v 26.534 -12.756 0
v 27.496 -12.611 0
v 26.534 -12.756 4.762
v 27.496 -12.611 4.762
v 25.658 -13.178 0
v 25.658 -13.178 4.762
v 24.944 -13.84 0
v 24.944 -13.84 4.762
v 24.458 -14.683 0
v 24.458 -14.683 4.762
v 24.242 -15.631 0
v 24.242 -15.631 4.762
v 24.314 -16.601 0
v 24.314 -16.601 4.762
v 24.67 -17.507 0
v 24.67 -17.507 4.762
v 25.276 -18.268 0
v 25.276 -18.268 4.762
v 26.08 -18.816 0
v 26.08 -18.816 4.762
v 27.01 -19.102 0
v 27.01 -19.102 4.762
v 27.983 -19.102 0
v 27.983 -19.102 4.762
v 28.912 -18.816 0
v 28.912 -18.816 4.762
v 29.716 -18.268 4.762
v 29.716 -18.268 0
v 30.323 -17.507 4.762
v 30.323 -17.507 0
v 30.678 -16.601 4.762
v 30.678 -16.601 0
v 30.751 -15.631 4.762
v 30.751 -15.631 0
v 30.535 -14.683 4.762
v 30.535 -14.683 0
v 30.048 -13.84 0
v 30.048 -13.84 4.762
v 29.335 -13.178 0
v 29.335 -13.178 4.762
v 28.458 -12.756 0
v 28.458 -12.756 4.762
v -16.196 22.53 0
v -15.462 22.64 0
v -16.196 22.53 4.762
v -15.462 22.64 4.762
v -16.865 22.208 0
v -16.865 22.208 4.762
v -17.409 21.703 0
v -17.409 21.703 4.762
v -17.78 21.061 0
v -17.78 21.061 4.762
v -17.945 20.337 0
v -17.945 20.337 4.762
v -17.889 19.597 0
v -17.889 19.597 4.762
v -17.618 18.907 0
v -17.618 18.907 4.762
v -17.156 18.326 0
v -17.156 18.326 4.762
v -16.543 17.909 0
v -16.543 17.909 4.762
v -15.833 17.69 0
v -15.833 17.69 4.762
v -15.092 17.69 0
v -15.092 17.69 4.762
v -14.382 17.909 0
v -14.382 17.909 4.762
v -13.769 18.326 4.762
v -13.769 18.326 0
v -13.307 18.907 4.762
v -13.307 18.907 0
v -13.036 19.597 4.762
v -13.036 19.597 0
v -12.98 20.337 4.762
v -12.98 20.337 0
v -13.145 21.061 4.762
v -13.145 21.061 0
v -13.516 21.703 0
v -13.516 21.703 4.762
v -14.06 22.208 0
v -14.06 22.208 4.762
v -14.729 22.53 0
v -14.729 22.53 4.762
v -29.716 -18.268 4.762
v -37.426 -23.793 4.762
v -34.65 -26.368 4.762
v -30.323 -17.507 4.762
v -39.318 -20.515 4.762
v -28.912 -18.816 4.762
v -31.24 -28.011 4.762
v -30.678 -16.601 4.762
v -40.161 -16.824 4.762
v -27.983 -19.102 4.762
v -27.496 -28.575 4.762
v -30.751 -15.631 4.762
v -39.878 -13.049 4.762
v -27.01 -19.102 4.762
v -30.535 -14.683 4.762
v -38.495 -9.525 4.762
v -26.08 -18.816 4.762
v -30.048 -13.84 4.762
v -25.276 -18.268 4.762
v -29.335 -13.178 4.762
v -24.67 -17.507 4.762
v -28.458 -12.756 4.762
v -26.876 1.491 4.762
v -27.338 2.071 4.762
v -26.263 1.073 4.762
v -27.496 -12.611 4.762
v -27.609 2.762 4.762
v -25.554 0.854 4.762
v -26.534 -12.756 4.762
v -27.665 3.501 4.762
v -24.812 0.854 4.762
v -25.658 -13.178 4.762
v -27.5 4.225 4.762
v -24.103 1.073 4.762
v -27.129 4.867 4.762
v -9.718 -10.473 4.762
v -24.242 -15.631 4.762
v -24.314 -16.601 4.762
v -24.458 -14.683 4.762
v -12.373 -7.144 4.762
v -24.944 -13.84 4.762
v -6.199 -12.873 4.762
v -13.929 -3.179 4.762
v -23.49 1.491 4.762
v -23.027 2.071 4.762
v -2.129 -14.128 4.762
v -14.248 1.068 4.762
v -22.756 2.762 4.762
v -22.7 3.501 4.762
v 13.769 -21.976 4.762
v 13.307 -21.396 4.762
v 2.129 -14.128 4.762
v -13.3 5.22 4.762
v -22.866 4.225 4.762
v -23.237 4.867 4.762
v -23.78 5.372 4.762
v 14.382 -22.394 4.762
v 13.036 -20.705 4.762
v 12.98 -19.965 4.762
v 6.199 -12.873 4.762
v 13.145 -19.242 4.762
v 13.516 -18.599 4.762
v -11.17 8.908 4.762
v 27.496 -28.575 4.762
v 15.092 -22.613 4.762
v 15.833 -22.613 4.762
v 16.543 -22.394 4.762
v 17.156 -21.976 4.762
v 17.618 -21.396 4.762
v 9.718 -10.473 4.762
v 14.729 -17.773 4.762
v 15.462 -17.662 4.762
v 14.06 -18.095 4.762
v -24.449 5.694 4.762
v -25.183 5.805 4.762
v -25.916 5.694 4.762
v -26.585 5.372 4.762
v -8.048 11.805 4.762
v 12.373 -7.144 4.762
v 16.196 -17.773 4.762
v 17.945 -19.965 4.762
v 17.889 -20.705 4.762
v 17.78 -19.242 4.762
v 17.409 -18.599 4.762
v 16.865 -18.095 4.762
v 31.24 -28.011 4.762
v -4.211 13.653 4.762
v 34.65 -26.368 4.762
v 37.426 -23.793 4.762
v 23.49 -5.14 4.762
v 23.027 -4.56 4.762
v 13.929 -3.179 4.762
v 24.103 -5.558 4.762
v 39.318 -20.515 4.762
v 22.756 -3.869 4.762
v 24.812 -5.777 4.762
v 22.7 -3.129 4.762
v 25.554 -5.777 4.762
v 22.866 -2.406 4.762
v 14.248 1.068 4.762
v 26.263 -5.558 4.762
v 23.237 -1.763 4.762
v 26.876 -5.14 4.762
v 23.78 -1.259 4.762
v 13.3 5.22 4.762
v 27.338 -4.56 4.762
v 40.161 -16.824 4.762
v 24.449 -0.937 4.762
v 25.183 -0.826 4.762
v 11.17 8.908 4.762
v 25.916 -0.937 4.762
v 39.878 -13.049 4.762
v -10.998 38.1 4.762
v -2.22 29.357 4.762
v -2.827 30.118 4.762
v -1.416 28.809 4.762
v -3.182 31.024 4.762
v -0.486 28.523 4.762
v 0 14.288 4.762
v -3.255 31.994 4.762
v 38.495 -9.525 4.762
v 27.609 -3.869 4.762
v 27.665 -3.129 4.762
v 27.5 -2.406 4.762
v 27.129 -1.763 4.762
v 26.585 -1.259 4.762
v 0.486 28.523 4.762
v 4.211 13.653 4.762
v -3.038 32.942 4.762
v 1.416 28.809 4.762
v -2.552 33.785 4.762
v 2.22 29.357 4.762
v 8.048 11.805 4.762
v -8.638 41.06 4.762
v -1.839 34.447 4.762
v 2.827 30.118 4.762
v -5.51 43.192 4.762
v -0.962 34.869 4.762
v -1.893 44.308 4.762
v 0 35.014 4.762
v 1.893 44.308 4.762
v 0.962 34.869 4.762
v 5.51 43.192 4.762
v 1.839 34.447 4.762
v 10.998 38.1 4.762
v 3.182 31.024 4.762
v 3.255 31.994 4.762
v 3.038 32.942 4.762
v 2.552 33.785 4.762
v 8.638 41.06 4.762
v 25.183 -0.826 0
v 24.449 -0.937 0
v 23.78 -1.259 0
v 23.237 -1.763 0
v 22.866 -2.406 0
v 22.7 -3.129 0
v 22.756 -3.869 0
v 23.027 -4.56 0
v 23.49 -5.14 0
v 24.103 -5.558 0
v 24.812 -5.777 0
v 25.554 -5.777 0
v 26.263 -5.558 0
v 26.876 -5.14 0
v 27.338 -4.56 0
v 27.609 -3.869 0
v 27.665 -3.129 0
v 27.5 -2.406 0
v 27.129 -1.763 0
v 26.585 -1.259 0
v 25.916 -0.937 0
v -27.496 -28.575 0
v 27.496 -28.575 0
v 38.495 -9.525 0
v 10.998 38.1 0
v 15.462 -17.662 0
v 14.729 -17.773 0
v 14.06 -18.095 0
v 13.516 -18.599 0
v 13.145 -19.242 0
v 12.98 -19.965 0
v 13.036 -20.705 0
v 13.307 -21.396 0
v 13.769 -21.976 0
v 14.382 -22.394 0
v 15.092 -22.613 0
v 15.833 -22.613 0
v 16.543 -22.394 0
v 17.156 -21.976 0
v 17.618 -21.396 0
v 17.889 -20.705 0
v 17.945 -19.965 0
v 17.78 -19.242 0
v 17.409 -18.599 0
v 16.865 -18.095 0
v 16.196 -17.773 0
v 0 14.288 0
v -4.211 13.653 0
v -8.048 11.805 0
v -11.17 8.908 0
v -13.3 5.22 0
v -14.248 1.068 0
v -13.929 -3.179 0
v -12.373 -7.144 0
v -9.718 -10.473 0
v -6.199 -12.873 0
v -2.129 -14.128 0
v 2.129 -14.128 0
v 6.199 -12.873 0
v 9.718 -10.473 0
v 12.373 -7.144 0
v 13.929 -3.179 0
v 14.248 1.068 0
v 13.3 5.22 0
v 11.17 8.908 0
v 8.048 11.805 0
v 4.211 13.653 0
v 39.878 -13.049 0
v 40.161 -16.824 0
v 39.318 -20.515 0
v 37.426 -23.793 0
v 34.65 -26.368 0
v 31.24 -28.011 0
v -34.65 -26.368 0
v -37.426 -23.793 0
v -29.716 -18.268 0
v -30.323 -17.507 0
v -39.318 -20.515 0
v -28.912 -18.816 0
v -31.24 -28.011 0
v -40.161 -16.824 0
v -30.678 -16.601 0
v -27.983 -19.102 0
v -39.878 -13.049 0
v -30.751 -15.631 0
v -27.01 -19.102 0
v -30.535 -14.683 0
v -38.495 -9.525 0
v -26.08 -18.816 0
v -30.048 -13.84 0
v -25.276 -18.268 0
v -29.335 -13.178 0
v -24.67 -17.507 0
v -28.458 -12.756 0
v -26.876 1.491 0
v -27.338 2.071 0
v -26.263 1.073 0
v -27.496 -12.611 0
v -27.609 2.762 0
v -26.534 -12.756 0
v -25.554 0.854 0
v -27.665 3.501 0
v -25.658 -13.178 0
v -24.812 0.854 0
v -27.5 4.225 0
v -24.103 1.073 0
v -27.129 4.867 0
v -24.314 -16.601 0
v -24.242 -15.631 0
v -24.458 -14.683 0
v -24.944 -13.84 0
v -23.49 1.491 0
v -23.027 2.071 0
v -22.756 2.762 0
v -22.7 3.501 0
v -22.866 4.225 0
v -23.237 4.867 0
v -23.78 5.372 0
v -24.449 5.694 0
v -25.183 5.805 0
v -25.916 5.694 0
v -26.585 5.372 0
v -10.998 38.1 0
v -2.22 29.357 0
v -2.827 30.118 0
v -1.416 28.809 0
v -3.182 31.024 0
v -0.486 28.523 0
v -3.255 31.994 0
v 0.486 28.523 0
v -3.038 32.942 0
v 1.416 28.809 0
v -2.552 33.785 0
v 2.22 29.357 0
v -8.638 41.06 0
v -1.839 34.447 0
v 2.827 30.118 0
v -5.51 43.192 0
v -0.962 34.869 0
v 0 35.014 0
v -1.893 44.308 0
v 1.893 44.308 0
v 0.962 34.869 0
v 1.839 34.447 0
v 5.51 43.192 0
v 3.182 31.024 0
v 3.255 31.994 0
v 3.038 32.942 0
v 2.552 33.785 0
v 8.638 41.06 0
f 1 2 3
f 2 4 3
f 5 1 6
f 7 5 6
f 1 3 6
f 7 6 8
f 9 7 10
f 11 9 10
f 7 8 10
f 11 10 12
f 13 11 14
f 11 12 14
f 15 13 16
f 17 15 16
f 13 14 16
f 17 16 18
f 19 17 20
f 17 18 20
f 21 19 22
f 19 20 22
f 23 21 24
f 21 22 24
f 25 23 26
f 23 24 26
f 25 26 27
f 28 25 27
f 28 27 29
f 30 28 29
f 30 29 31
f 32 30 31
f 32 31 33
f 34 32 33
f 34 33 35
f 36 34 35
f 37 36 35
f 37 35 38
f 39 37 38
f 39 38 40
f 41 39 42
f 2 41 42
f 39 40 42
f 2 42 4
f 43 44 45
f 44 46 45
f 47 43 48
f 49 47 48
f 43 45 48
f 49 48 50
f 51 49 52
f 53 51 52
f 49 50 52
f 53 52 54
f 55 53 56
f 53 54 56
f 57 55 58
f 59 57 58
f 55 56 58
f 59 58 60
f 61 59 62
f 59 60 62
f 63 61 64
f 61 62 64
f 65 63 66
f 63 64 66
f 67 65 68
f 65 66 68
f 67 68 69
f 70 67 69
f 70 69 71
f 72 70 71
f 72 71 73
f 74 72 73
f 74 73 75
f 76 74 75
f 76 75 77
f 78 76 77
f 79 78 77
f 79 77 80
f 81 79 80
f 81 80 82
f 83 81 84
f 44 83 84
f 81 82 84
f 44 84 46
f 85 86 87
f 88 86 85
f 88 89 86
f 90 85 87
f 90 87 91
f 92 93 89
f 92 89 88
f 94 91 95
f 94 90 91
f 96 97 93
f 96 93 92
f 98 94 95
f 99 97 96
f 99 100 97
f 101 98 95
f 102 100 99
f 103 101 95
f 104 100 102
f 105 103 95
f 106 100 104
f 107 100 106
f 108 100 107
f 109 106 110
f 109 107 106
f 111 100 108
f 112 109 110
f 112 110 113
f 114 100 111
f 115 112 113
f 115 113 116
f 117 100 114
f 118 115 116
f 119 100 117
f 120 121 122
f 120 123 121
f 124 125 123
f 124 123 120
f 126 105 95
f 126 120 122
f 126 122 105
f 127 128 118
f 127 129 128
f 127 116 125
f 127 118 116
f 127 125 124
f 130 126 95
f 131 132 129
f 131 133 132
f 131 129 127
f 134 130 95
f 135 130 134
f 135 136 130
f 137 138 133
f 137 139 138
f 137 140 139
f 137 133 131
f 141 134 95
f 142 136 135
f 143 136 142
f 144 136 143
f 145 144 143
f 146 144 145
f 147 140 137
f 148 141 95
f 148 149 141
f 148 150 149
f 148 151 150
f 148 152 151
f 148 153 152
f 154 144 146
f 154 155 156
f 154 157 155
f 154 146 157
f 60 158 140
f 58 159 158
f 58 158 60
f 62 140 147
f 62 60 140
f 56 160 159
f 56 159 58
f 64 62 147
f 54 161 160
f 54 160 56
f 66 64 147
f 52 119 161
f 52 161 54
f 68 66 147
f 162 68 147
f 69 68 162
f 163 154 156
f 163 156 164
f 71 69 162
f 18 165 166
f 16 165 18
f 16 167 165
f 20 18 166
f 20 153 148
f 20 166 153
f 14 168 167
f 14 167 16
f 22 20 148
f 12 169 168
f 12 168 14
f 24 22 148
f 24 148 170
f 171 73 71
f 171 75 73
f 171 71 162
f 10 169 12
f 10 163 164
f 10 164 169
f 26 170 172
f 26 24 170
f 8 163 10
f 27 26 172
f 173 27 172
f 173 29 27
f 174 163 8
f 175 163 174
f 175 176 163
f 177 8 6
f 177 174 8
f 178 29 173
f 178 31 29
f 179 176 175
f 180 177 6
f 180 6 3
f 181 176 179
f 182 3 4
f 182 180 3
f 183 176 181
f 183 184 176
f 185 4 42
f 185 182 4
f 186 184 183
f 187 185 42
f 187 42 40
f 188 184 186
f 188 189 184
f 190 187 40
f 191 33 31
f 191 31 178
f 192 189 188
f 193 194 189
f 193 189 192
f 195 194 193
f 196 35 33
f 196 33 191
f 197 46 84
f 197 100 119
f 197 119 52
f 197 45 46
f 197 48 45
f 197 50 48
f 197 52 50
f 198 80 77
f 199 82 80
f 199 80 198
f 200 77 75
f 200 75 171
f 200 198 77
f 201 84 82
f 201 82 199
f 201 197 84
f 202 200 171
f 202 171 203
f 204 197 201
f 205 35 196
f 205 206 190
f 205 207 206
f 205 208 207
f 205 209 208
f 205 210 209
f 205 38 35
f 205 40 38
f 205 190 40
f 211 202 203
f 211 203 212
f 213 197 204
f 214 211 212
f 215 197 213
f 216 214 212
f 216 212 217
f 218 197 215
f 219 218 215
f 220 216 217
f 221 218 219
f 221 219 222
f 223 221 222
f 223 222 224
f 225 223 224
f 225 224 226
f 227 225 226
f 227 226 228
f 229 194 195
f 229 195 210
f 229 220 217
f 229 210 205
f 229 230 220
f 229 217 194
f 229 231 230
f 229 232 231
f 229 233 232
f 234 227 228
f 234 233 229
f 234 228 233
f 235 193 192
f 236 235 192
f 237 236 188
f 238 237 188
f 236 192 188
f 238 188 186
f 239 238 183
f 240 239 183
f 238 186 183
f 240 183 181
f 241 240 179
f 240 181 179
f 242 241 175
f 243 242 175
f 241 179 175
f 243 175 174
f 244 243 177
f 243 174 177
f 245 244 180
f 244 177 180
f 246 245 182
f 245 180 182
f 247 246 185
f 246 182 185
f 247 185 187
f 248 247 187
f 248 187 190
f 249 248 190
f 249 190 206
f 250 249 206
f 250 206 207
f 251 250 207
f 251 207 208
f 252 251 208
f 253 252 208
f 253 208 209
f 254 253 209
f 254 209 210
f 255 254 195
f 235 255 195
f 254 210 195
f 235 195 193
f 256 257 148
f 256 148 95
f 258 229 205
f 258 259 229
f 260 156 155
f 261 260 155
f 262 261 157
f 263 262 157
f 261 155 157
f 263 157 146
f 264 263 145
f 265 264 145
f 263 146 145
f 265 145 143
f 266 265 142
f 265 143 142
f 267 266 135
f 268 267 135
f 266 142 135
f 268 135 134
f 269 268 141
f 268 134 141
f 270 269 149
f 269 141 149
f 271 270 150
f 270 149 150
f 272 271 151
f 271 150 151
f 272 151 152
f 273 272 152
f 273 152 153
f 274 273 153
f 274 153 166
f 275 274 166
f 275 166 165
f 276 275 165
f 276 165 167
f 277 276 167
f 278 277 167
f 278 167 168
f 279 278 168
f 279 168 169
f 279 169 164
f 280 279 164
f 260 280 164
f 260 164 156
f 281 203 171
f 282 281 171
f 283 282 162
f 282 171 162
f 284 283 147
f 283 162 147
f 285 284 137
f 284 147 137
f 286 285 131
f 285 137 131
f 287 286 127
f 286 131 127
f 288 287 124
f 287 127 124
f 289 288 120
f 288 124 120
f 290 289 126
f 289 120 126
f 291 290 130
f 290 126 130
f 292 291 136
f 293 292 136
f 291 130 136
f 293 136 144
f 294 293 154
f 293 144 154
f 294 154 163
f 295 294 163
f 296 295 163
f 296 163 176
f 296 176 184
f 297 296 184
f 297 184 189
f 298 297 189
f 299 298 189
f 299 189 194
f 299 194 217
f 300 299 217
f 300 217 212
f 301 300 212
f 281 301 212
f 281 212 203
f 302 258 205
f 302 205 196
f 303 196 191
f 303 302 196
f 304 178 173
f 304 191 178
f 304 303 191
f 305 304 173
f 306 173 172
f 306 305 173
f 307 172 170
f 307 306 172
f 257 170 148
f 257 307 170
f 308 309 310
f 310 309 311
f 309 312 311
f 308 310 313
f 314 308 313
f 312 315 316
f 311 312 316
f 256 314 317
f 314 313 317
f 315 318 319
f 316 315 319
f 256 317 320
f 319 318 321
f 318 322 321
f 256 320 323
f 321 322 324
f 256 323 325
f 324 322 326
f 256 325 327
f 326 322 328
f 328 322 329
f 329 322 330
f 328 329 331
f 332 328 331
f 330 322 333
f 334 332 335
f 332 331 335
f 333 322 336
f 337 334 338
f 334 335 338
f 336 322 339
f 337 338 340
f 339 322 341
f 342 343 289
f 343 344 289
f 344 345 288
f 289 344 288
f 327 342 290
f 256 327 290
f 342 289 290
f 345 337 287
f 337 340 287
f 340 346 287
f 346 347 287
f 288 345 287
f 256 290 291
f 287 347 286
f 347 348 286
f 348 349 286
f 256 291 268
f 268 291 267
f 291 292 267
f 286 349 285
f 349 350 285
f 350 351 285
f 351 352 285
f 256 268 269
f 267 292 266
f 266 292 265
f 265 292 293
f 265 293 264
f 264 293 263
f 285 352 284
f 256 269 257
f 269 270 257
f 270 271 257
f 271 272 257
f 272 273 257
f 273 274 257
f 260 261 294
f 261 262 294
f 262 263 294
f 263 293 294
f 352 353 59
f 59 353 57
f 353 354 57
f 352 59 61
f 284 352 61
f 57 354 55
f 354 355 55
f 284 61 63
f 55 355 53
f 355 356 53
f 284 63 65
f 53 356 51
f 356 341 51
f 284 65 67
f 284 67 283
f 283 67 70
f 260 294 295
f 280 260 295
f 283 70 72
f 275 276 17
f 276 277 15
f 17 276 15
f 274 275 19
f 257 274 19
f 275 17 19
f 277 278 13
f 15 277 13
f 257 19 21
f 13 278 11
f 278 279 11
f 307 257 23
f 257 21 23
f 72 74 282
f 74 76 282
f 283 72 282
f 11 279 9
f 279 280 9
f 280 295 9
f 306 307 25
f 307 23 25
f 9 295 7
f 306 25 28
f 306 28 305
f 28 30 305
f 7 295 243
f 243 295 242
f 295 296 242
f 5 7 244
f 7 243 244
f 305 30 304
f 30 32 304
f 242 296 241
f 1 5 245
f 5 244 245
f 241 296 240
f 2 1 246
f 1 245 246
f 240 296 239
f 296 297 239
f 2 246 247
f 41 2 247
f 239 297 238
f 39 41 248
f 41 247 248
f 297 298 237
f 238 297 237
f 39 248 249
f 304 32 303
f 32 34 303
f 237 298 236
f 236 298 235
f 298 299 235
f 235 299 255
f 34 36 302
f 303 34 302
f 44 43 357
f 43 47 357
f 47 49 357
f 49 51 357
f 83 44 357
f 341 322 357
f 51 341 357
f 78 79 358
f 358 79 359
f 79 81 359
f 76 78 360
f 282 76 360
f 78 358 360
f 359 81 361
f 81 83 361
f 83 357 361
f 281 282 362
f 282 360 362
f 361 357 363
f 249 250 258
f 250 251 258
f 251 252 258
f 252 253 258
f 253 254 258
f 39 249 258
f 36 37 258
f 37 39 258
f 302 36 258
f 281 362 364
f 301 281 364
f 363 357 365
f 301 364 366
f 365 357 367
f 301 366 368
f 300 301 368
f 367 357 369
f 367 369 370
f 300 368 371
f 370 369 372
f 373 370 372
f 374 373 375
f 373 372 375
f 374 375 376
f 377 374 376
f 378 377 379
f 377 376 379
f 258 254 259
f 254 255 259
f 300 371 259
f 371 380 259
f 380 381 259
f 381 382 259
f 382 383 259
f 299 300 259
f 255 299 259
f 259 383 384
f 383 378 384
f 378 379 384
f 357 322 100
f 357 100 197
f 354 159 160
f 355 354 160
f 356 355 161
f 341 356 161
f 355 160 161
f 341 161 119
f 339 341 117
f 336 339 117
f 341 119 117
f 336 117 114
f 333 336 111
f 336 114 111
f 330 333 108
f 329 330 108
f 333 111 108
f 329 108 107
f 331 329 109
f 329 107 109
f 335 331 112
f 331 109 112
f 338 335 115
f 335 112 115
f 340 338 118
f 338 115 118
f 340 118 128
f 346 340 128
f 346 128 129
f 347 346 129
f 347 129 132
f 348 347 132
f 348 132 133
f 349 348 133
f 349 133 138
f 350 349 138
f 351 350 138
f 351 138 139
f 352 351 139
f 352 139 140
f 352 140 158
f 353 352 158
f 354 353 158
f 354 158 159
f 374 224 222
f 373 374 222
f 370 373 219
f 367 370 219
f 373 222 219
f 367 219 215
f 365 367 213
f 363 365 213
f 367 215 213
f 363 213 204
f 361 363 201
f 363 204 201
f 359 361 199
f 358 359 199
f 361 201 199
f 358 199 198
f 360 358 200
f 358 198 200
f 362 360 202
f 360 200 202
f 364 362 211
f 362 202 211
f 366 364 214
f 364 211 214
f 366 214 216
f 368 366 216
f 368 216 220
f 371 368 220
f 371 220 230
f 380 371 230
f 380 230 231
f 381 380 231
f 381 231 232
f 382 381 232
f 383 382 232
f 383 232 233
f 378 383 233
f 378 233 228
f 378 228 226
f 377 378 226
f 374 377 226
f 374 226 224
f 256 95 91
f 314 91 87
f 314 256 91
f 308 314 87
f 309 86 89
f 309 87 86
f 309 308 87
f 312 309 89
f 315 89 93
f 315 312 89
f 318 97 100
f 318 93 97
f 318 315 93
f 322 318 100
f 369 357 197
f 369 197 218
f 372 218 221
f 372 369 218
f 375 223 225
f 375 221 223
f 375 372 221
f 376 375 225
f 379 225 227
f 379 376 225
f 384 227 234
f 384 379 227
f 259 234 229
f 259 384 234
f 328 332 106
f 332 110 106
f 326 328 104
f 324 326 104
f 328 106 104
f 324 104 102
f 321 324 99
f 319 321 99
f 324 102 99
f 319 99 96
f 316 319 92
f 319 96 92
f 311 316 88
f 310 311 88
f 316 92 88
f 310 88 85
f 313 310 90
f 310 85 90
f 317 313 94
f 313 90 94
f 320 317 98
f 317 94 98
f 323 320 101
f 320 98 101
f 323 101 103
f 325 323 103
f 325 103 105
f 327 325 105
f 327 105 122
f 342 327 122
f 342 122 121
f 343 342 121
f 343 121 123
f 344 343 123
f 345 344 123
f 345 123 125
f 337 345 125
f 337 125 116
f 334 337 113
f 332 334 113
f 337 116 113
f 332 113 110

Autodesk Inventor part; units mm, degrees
ref_plane "YZ Plane" through (0, 0, 0) normal (1, 0, 0) x (0, 1, 0)
ref_plane "XZ Plane" through (0, 0, 0) normal (0, 1, 0) x (-1, 0, 0)
ref_plane "XY Plane" through (0, 0, 0) normal (0, 0, 1) x (1, 0, 0)
sketch "Sketch2" plane through (0, 0, 0) normal (0, 0, 1) x (1, 0, 0)
  line L0 (27.4963, -15.875) -> (0, 0) construction
  arc A0 (-38.4948, -9.525) -> (-27.4963, -28.575) centre (-27.4963, -15.875) ccw
  arc A1 (27.4963, -28.575) -> (38.4948, -9.525) centre (27.4963, -15.875) ccw
  arc A2 (10.9985, 38.1) -> (-10.9985, 38.1) centre (0, 31.75) ccw
  line L1 (-38.4948, -9.525) -> (-10.9985, 38.1)
  line L2 (10.9985, 38.1) -> (38.4948, -9.525)
  line L3 (27.4963, -28.575) -> (-27.4963, -28.575)
  point P0 (-25.1827, 3.3154)
  point P1 (-20.1512, -15.4625)
  point P2 (-3.3154, -25.1827)
  point P3 (15.4625, -20.1512)
  point P4 (25.1827, -3.3154)
  point P5 (20.1512, 15.4625)
  point P6 (3.3154, 25.1827)
  point P7 (-15.4625, 20.1512)
  dimension "d74" = 31.75
  dimension "d77" = 360
  dimension "d80" = 25.4
  dimension "d83" = 360
  dimension "d92" = 12.7
extrude "Plate2" add sketch "Sketch2" along normal blind 4.7625
hole "Hole3" at (-27.4963, -15.875, 0) at (0, 31.75, 0) at (27.4963, -15.875, 0) direction (0, 0, 1) diameter 6.5278 end through all clearance for "Flat Head Machine Screw (82)" size "1/4" standard "Ansi Unified Screw Threads"
hole "Hole4" at (0, 0, 0) direction (0, 0, 1) diameter 28.575 end through all
hole "Hole5" at (-25.1827, 3.3154, 0) at (15.4625, -20.1512, 0) at (25.1827, -3.3154, 0) at (-15.4625, 20.1512, 0) direction (0, 0, 1) diameter 4.9784 end through all clearance for "Flat Head Machine Screw (82)" size "#10" standard "Ansi Unified Screw Threads"
equation "\"BendRadius\" = Thickness"
equation "\"BendReliefWidth\" = Thickness"
equation "\"BendReliefDepth\" = 0.5 * Thickness"
equation "\"CornerReliefSize\" = 4 * Thickness"
equation "\"MinimumRemnant\" = 2 * Thickness"
equation "\"TransitionRadius\" = BendRadius"
equation "\"JacobiRadiusSize\" = BendRadius"
equation "\"GapSize\" = Thickness"
equation "\"Thickness\" = 4.7625"
properties part number "PLATE,TURRET,MOTOR,MOUNT" material "Aluminum 6061"
